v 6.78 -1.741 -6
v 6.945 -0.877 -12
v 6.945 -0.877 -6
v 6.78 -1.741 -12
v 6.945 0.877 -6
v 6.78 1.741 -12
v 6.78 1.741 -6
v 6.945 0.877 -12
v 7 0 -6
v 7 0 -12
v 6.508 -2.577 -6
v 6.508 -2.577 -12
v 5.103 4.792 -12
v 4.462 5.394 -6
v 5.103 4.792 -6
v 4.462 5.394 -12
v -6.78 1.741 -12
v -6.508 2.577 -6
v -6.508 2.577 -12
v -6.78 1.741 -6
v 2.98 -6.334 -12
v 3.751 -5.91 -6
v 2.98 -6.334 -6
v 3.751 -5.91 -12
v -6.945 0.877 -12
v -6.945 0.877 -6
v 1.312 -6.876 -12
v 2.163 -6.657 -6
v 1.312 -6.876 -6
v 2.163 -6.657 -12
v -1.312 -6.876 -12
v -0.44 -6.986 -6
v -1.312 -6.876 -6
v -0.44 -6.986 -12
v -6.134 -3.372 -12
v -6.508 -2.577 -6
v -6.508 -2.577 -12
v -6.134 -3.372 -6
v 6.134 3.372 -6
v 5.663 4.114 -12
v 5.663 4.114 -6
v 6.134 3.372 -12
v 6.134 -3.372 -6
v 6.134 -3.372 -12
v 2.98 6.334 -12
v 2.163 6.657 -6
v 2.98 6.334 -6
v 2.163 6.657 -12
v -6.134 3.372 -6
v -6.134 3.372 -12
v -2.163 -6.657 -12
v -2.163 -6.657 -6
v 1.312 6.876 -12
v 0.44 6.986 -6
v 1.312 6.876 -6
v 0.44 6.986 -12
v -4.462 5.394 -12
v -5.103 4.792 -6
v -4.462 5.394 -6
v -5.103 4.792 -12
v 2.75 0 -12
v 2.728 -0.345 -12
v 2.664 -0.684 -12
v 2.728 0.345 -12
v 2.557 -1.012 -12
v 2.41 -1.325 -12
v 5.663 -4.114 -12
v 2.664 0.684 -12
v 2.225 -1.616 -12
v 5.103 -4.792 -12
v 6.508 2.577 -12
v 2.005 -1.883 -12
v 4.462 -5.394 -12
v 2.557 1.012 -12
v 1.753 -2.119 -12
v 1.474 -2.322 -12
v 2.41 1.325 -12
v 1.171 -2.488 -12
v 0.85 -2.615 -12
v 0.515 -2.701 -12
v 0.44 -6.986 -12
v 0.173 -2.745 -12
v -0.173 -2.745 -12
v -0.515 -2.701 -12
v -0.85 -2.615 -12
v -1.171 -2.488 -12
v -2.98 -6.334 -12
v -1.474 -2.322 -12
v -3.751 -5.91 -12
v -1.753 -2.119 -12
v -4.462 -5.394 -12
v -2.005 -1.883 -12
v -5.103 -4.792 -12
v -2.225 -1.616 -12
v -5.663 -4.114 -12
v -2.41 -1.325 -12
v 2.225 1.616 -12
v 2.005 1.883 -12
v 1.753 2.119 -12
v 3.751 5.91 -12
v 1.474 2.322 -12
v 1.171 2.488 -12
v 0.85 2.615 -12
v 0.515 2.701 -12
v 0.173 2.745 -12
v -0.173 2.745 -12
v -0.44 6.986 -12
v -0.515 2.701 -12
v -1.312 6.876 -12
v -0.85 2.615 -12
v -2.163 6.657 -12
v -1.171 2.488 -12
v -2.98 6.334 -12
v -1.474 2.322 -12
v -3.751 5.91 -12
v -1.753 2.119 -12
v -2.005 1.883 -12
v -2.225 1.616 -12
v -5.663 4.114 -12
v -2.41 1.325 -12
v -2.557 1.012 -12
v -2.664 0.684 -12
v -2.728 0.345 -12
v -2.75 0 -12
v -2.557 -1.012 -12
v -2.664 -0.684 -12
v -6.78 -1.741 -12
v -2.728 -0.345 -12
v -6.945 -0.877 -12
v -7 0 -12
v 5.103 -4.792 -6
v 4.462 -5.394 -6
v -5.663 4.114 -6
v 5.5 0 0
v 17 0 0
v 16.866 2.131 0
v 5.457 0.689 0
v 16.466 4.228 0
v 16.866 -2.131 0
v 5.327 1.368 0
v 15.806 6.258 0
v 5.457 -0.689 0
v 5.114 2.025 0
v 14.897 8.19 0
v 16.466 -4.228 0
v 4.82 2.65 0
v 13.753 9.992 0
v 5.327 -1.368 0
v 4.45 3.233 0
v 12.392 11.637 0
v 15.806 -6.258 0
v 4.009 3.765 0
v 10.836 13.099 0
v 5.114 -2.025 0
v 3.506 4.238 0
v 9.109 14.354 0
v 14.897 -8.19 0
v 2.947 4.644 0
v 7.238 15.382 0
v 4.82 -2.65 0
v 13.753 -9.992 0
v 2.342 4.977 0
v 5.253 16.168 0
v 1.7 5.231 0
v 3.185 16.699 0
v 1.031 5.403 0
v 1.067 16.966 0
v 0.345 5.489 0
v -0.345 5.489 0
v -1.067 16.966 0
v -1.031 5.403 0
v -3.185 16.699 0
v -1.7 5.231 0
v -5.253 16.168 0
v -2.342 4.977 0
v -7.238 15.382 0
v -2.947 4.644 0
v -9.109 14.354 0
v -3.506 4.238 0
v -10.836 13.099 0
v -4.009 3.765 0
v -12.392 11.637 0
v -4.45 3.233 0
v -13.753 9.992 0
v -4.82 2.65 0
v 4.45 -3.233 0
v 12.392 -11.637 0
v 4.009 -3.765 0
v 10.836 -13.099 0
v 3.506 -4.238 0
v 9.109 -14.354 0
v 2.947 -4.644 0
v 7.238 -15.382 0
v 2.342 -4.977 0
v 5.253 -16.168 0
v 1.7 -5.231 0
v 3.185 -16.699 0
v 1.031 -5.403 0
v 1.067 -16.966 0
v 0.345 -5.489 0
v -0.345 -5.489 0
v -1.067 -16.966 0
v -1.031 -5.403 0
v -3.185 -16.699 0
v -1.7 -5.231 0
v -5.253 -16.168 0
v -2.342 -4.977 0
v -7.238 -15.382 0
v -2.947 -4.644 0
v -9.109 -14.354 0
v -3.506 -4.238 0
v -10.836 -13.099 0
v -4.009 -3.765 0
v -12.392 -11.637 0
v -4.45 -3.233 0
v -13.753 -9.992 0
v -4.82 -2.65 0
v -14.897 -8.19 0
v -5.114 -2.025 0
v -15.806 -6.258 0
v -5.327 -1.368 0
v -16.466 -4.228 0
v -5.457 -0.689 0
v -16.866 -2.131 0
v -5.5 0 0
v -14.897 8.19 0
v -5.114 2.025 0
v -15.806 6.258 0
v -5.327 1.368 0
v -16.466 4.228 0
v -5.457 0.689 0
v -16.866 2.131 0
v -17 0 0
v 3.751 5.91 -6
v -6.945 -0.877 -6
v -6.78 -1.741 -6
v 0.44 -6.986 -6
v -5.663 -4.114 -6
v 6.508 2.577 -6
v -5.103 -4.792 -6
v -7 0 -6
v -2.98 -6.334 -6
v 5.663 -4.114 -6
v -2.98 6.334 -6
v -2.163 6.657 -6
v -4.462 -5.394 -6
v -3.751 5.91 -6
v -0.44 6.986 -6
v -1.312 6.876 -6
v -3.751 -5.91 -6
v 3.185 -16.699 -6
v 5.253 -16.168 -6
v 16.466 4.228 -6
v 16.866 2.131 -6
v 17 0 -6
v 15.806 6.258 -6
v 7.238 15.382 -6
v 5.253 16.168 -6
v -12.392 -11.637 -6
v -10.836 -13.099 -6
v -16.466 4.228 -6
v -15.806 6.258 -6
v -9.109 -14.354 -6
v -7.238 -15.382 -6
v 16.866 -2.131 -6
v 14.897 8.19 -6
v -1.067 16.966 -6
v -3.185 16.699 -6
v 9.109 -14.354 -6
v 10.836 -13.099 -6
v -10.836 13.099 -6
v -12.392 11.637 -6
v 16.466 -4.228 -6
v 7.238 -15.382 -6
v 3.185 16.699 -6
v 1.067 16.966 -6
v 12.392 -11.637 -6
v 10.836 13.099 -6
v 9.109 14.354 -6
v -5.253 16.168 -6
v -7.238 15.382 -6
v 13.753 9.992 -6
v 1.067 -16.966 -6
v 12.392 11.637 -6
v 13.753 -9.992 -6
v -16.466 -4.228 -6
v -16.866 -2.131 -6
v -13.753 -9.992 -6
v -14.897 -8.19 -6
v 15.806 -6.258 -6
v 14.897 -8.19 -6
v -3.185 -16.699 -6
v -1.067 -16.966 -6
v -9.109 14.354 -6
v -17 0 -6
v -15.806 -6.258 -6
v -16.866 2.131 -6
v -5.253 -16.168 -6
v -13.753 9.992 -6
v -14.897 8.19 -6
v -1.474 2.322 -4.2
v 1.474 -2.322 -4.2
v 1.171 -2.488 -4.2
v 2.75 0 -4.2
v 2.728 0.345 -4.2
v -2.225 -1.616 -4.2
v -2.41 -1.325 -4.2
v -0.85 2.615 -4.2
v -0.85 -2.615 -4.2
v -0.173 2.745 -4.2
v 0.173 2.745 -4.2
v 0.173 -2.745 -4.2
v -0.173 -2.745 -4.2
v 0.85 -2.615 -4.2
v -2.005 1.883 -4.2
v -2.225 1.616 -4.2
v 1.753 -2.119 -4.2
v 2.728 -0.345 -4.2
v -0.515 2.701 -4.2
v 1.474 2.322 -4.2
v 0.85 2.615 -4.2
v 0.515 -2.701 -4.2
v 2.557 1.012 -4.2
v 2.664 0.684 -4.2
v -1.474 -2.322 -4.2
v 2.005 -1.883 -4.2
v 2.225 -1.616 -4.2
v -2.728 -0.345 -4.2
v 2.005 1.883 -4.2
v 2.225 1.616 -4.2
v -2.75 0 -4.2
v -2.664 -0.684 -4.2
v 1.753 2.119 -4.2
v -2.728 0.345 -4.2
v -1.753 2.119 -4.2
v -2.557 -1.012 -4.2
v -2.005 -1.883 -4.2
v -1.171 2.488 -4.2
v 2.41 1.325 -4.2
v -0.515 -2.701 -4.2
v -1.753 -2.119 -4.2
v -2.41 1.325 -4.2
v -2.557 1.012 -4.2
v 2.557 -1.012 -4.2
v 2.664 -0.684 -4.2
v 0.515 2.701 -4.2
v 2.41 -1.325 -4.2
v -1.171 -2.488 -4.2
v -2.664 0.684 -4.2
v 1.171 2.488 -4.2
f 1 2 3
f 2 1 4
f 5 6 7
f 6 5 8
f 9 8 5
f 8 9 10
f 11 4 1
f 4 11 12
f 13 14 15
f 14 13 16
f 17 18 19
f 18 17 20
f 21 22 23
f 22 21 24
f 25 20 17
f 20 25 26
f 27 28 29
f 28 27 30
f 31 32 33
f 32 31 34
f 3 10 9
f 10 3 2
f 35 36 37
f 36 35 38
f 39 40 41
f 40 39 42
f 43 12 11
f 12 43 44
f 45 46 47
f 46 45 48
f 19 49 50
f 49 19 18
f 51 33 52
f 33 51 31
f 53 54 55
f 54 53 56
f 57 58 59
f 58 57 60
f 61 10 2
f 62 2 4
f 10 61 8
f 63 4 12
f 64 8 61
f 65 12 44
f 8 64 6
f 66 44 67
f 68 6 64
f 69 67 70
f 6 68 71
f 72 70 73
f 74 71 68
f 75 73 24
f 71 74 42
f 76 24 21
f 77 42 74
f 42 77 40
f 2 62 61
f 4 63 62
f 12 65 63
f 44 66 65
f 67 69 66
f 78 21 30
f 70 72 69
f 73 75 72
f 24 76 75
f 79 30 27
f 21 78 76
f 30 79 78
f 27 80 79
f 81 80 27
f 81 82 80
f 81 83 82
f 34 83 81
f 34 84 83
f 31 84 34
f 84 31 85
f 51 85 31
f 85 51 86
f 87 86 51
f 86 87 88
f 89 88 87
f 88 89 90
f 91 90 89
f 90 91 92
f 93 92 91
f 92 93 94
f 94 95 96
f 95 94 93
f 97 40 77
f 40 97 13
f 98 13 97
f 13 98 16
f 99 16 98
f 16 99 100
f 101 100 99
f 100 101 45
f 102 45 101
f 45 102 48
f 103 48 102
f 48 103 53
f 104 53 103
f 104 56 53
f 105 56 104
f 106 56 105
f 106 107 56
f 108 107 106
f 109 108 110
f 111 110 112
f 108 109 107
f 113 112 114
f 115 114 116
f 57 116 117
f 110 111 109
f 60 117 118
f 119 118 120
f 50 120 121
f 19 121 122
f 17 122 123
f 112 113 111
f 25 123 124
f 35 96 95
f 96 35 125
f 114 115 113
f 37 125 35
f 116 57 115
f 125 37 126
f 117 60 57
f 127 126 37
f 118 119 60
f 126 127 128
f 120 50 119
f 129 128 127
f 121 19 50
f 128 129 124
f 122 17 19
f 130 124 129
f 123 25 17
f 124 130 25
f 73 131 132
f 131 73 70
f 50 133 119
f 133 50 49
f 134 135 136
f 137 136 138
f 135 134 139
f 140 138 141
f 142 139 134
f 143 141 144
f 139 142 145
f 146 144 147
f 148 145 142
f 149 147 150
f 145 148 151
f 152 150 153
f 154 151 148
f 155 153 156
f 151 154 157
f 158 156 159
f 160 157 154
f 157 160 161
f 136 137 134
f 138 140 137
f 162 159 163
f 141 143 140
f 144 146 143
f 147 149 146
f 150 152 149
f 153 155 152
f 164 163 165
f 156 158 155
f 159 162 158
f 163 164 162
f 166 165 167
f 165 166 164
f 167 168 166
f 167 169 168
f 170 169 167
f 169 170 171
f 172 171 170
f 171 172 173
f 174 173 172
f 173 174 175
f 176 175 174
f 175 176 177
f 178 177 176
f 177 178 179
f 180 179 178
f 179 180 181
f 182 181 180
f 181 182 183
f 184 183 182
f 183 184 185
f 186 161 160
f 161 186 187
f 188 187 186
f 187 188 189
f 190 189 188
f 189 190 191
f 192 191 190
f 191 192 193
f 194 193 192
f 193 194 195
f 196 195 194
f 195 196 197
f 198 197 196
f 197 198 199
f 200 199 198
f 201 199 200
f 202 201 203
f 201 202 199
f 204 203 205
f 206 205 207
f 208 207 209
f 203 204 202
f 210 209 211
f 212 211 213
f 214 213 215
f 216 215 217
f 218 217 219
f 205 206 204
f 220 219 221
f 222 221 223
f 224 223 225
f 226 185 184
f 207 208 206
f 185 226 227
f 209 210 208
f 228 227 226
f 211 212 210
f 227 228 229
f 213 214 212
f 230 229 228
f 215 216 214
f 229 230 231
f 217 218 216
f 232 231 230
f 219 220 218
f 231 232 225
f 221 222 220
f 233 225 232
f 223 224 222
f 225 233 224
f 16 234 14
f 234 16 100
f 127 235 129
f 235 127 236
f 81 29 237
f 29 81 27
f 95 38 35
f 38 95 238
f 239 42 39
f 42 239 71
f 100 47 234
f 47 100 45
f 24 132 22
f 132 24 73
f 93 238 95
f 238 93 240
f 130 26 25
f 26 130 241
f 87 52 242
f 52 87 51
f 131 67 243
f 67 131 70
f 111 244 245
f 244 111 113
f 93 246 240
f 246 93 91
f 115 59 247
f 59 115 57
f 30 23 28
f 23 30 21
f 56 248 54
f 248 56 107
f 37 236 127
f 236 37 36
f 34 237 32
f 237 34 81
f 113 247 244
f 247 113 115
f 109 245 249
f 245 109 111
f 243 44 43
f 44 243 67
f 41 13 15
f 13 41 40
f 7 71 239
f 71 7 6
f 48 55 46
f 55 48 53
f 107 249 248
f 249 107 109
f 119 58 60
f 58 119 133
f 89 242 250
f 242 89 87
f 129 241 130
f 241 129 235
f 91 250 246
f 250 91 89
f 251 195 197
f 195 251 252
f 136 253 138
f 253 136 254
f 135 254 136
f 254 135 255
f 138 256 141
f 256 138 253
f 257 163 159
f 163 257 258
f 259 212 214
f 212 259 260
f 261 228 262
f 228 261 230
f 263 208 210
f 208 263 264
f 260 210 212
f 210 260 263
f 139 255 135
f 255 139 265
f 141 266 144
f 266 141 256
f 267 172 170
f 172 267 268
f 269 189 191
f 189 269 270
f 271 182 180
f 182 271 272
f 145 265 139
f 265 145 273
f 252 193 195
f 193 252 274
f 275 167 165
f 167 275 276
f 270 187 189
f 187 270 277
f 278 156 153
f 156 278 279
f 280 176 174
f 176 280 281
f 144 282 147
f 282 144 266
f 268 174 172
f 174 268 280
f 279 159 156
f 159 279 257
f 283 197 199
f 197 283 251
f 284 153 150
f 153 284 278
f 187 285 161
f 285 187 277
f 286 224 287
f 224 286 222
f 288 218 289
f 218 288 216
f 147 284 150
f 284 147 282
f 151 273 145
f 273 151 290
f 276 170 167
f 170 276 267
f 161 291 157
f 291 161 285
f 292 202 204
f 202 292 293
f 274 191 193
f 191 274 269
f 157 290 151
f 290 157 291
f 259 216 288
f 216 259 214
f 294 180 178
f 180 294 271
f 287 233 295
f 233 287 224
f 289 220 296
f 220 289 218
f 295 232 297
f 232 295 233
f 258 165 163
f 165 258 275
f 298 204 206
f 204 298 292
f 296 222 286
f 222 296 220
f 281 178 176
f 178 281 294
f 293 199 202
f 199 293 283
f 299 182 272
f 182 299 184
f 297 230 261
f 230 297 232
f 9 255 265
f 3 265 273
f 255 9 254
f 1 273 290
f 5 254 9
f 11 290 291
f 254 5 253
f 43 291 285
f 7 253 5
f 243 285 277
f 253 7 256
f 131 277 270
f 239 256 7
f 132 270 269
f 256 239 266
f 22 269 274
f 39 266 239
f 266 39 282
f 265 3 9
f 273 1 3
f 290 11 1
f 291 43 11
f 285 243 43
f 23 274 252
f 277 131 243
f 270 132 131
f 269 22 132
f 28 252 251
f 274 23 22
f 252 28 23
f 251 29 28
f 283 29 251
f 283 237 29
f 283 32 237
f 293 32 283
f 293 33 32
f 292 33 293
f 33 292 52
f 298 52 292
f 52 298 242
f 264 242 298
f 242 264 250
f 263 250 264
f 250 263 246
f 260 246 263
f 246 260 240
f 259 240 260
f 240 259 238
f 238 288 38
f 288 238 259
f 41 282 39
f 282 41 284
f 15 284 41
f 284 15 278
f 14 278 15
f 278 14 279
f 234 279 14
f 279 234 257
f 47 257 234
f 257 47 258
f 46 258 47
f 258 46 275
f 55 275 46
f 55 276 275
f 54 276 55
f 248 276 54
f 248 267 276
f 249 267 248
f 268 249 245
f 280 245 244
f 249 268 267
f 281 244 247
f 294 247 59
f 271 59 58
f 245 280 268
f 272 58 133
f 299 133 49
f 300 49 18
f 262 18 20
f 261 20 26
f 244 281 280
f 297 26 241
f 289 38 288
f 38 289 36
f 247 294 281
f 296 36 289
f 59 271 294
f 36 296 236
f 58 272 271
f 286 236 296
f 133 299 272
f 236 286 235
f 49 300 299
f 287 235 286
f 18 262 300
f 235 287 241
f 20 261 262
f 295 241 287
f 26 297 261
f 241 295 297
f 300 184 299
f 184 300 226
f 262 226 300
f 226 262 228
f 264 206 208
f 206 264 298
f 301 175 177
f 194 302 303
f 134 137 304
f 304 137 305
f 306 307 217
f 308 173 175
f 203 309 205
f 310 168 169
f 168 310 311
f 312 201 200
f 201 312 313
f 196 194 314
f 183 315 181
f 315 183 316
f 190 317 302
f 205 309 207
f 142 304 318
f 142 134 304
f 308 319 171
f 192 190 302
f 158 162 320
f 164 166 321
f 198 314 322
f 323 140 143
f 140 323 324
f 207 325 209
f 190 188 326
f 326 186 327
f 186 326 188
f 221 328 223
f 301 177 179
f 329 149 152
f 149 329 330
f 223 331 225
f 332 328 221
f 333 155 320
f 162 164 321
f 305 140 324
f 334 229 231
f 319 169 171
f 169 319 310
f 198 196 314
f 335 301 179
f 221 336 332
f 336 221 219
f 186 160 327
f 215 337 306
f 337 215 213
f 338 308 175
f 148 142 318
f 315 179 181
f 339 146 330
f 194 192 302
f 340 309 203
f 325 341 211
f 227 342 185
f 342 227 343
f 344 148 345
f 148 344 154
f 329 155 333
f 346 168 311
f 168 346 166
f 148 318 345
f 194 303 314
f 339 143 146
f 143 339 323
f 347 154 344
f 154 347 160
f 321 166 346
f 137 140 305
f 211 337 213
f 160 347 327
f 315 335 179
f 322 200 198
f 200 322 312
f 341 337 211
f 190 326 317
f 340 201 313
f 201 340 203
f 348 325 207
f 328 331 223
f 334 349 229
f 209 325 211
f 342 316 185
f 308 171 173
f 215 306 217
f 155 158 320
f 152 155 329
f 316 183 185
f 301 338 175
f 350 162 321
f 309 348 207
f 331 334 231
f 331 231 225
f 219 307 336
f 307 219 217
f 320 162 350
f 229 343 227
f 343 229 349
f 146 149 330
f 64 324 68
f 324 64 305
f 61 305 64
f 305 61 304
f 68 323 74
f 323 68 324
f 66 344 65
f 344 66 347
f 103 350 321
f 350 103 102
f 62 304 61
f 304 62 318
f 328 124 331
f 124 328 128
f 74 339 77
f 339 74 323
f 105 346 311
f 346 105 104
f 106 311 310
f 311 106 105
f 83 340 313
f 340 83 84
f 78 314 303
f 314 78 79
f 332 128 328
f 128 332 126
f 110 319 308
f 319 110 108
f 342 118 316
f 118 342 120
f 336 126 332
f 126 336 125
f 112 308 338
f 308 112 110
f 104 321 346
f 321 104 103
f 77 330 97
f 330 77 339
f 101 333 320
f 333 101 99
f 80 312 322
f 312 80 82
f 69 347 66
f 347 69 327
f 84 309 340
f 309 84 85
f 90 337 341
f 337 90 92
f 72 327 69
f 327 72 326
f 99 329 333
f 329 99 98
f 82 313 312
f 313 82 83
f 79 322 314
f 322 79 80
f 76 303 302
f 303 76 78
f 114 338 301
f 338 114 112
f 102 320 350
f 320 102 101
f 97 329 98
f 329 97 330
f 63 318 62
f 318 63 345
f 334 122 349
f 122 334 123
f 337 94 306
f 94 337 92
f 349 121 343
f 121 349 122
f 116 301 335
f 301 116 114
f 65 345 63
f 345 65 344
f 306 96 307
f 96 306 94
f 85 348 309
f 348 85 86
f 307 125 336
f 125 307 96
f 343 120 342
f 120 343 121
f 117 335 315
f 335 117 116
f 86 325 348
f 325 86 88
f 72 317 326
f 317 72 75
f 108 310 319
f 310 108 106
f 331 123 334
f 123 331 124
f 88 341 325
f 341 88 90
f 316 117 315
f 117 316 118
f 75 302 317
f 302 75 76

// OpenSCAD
$fn = 50;


difference() {
	union() {
		translate(v = [0, 0, -12.0000000000]) {
			cylinder(h = 12, r = 7.0000000000);
		}
		translate(v = [0, 0, -6.0000000000]) {
			cylinder(h = 6, r = 17.0000000000);
		}
	}
	union() {
		translate(v = [0, 0, 0]) {
			rotate(a = [0, 0, 0]) {
				difference() {
					union() {
						#translate(v = [0, 0, -12.0000000000]) {
							cylinder(h = 12, r = 2.2500000000);
						}
						#translate(v = [0, 0, -4.2000000000]) {
							cylinder(h = 4.2000000000, r1 = 2.7500000000, r2 = 5.5000000000);
						}
						#translate(v = [0, 0, -12.0000000000]) {
							cylinder(h = 12, r = 2.7500000000);
						}
						#translate(v = [0, 0, -12.0000000000]) {
							cylinder(h = 12, r = 2.2500000000);
						}
					}
					union();
				}
			}
		}
	}
}
